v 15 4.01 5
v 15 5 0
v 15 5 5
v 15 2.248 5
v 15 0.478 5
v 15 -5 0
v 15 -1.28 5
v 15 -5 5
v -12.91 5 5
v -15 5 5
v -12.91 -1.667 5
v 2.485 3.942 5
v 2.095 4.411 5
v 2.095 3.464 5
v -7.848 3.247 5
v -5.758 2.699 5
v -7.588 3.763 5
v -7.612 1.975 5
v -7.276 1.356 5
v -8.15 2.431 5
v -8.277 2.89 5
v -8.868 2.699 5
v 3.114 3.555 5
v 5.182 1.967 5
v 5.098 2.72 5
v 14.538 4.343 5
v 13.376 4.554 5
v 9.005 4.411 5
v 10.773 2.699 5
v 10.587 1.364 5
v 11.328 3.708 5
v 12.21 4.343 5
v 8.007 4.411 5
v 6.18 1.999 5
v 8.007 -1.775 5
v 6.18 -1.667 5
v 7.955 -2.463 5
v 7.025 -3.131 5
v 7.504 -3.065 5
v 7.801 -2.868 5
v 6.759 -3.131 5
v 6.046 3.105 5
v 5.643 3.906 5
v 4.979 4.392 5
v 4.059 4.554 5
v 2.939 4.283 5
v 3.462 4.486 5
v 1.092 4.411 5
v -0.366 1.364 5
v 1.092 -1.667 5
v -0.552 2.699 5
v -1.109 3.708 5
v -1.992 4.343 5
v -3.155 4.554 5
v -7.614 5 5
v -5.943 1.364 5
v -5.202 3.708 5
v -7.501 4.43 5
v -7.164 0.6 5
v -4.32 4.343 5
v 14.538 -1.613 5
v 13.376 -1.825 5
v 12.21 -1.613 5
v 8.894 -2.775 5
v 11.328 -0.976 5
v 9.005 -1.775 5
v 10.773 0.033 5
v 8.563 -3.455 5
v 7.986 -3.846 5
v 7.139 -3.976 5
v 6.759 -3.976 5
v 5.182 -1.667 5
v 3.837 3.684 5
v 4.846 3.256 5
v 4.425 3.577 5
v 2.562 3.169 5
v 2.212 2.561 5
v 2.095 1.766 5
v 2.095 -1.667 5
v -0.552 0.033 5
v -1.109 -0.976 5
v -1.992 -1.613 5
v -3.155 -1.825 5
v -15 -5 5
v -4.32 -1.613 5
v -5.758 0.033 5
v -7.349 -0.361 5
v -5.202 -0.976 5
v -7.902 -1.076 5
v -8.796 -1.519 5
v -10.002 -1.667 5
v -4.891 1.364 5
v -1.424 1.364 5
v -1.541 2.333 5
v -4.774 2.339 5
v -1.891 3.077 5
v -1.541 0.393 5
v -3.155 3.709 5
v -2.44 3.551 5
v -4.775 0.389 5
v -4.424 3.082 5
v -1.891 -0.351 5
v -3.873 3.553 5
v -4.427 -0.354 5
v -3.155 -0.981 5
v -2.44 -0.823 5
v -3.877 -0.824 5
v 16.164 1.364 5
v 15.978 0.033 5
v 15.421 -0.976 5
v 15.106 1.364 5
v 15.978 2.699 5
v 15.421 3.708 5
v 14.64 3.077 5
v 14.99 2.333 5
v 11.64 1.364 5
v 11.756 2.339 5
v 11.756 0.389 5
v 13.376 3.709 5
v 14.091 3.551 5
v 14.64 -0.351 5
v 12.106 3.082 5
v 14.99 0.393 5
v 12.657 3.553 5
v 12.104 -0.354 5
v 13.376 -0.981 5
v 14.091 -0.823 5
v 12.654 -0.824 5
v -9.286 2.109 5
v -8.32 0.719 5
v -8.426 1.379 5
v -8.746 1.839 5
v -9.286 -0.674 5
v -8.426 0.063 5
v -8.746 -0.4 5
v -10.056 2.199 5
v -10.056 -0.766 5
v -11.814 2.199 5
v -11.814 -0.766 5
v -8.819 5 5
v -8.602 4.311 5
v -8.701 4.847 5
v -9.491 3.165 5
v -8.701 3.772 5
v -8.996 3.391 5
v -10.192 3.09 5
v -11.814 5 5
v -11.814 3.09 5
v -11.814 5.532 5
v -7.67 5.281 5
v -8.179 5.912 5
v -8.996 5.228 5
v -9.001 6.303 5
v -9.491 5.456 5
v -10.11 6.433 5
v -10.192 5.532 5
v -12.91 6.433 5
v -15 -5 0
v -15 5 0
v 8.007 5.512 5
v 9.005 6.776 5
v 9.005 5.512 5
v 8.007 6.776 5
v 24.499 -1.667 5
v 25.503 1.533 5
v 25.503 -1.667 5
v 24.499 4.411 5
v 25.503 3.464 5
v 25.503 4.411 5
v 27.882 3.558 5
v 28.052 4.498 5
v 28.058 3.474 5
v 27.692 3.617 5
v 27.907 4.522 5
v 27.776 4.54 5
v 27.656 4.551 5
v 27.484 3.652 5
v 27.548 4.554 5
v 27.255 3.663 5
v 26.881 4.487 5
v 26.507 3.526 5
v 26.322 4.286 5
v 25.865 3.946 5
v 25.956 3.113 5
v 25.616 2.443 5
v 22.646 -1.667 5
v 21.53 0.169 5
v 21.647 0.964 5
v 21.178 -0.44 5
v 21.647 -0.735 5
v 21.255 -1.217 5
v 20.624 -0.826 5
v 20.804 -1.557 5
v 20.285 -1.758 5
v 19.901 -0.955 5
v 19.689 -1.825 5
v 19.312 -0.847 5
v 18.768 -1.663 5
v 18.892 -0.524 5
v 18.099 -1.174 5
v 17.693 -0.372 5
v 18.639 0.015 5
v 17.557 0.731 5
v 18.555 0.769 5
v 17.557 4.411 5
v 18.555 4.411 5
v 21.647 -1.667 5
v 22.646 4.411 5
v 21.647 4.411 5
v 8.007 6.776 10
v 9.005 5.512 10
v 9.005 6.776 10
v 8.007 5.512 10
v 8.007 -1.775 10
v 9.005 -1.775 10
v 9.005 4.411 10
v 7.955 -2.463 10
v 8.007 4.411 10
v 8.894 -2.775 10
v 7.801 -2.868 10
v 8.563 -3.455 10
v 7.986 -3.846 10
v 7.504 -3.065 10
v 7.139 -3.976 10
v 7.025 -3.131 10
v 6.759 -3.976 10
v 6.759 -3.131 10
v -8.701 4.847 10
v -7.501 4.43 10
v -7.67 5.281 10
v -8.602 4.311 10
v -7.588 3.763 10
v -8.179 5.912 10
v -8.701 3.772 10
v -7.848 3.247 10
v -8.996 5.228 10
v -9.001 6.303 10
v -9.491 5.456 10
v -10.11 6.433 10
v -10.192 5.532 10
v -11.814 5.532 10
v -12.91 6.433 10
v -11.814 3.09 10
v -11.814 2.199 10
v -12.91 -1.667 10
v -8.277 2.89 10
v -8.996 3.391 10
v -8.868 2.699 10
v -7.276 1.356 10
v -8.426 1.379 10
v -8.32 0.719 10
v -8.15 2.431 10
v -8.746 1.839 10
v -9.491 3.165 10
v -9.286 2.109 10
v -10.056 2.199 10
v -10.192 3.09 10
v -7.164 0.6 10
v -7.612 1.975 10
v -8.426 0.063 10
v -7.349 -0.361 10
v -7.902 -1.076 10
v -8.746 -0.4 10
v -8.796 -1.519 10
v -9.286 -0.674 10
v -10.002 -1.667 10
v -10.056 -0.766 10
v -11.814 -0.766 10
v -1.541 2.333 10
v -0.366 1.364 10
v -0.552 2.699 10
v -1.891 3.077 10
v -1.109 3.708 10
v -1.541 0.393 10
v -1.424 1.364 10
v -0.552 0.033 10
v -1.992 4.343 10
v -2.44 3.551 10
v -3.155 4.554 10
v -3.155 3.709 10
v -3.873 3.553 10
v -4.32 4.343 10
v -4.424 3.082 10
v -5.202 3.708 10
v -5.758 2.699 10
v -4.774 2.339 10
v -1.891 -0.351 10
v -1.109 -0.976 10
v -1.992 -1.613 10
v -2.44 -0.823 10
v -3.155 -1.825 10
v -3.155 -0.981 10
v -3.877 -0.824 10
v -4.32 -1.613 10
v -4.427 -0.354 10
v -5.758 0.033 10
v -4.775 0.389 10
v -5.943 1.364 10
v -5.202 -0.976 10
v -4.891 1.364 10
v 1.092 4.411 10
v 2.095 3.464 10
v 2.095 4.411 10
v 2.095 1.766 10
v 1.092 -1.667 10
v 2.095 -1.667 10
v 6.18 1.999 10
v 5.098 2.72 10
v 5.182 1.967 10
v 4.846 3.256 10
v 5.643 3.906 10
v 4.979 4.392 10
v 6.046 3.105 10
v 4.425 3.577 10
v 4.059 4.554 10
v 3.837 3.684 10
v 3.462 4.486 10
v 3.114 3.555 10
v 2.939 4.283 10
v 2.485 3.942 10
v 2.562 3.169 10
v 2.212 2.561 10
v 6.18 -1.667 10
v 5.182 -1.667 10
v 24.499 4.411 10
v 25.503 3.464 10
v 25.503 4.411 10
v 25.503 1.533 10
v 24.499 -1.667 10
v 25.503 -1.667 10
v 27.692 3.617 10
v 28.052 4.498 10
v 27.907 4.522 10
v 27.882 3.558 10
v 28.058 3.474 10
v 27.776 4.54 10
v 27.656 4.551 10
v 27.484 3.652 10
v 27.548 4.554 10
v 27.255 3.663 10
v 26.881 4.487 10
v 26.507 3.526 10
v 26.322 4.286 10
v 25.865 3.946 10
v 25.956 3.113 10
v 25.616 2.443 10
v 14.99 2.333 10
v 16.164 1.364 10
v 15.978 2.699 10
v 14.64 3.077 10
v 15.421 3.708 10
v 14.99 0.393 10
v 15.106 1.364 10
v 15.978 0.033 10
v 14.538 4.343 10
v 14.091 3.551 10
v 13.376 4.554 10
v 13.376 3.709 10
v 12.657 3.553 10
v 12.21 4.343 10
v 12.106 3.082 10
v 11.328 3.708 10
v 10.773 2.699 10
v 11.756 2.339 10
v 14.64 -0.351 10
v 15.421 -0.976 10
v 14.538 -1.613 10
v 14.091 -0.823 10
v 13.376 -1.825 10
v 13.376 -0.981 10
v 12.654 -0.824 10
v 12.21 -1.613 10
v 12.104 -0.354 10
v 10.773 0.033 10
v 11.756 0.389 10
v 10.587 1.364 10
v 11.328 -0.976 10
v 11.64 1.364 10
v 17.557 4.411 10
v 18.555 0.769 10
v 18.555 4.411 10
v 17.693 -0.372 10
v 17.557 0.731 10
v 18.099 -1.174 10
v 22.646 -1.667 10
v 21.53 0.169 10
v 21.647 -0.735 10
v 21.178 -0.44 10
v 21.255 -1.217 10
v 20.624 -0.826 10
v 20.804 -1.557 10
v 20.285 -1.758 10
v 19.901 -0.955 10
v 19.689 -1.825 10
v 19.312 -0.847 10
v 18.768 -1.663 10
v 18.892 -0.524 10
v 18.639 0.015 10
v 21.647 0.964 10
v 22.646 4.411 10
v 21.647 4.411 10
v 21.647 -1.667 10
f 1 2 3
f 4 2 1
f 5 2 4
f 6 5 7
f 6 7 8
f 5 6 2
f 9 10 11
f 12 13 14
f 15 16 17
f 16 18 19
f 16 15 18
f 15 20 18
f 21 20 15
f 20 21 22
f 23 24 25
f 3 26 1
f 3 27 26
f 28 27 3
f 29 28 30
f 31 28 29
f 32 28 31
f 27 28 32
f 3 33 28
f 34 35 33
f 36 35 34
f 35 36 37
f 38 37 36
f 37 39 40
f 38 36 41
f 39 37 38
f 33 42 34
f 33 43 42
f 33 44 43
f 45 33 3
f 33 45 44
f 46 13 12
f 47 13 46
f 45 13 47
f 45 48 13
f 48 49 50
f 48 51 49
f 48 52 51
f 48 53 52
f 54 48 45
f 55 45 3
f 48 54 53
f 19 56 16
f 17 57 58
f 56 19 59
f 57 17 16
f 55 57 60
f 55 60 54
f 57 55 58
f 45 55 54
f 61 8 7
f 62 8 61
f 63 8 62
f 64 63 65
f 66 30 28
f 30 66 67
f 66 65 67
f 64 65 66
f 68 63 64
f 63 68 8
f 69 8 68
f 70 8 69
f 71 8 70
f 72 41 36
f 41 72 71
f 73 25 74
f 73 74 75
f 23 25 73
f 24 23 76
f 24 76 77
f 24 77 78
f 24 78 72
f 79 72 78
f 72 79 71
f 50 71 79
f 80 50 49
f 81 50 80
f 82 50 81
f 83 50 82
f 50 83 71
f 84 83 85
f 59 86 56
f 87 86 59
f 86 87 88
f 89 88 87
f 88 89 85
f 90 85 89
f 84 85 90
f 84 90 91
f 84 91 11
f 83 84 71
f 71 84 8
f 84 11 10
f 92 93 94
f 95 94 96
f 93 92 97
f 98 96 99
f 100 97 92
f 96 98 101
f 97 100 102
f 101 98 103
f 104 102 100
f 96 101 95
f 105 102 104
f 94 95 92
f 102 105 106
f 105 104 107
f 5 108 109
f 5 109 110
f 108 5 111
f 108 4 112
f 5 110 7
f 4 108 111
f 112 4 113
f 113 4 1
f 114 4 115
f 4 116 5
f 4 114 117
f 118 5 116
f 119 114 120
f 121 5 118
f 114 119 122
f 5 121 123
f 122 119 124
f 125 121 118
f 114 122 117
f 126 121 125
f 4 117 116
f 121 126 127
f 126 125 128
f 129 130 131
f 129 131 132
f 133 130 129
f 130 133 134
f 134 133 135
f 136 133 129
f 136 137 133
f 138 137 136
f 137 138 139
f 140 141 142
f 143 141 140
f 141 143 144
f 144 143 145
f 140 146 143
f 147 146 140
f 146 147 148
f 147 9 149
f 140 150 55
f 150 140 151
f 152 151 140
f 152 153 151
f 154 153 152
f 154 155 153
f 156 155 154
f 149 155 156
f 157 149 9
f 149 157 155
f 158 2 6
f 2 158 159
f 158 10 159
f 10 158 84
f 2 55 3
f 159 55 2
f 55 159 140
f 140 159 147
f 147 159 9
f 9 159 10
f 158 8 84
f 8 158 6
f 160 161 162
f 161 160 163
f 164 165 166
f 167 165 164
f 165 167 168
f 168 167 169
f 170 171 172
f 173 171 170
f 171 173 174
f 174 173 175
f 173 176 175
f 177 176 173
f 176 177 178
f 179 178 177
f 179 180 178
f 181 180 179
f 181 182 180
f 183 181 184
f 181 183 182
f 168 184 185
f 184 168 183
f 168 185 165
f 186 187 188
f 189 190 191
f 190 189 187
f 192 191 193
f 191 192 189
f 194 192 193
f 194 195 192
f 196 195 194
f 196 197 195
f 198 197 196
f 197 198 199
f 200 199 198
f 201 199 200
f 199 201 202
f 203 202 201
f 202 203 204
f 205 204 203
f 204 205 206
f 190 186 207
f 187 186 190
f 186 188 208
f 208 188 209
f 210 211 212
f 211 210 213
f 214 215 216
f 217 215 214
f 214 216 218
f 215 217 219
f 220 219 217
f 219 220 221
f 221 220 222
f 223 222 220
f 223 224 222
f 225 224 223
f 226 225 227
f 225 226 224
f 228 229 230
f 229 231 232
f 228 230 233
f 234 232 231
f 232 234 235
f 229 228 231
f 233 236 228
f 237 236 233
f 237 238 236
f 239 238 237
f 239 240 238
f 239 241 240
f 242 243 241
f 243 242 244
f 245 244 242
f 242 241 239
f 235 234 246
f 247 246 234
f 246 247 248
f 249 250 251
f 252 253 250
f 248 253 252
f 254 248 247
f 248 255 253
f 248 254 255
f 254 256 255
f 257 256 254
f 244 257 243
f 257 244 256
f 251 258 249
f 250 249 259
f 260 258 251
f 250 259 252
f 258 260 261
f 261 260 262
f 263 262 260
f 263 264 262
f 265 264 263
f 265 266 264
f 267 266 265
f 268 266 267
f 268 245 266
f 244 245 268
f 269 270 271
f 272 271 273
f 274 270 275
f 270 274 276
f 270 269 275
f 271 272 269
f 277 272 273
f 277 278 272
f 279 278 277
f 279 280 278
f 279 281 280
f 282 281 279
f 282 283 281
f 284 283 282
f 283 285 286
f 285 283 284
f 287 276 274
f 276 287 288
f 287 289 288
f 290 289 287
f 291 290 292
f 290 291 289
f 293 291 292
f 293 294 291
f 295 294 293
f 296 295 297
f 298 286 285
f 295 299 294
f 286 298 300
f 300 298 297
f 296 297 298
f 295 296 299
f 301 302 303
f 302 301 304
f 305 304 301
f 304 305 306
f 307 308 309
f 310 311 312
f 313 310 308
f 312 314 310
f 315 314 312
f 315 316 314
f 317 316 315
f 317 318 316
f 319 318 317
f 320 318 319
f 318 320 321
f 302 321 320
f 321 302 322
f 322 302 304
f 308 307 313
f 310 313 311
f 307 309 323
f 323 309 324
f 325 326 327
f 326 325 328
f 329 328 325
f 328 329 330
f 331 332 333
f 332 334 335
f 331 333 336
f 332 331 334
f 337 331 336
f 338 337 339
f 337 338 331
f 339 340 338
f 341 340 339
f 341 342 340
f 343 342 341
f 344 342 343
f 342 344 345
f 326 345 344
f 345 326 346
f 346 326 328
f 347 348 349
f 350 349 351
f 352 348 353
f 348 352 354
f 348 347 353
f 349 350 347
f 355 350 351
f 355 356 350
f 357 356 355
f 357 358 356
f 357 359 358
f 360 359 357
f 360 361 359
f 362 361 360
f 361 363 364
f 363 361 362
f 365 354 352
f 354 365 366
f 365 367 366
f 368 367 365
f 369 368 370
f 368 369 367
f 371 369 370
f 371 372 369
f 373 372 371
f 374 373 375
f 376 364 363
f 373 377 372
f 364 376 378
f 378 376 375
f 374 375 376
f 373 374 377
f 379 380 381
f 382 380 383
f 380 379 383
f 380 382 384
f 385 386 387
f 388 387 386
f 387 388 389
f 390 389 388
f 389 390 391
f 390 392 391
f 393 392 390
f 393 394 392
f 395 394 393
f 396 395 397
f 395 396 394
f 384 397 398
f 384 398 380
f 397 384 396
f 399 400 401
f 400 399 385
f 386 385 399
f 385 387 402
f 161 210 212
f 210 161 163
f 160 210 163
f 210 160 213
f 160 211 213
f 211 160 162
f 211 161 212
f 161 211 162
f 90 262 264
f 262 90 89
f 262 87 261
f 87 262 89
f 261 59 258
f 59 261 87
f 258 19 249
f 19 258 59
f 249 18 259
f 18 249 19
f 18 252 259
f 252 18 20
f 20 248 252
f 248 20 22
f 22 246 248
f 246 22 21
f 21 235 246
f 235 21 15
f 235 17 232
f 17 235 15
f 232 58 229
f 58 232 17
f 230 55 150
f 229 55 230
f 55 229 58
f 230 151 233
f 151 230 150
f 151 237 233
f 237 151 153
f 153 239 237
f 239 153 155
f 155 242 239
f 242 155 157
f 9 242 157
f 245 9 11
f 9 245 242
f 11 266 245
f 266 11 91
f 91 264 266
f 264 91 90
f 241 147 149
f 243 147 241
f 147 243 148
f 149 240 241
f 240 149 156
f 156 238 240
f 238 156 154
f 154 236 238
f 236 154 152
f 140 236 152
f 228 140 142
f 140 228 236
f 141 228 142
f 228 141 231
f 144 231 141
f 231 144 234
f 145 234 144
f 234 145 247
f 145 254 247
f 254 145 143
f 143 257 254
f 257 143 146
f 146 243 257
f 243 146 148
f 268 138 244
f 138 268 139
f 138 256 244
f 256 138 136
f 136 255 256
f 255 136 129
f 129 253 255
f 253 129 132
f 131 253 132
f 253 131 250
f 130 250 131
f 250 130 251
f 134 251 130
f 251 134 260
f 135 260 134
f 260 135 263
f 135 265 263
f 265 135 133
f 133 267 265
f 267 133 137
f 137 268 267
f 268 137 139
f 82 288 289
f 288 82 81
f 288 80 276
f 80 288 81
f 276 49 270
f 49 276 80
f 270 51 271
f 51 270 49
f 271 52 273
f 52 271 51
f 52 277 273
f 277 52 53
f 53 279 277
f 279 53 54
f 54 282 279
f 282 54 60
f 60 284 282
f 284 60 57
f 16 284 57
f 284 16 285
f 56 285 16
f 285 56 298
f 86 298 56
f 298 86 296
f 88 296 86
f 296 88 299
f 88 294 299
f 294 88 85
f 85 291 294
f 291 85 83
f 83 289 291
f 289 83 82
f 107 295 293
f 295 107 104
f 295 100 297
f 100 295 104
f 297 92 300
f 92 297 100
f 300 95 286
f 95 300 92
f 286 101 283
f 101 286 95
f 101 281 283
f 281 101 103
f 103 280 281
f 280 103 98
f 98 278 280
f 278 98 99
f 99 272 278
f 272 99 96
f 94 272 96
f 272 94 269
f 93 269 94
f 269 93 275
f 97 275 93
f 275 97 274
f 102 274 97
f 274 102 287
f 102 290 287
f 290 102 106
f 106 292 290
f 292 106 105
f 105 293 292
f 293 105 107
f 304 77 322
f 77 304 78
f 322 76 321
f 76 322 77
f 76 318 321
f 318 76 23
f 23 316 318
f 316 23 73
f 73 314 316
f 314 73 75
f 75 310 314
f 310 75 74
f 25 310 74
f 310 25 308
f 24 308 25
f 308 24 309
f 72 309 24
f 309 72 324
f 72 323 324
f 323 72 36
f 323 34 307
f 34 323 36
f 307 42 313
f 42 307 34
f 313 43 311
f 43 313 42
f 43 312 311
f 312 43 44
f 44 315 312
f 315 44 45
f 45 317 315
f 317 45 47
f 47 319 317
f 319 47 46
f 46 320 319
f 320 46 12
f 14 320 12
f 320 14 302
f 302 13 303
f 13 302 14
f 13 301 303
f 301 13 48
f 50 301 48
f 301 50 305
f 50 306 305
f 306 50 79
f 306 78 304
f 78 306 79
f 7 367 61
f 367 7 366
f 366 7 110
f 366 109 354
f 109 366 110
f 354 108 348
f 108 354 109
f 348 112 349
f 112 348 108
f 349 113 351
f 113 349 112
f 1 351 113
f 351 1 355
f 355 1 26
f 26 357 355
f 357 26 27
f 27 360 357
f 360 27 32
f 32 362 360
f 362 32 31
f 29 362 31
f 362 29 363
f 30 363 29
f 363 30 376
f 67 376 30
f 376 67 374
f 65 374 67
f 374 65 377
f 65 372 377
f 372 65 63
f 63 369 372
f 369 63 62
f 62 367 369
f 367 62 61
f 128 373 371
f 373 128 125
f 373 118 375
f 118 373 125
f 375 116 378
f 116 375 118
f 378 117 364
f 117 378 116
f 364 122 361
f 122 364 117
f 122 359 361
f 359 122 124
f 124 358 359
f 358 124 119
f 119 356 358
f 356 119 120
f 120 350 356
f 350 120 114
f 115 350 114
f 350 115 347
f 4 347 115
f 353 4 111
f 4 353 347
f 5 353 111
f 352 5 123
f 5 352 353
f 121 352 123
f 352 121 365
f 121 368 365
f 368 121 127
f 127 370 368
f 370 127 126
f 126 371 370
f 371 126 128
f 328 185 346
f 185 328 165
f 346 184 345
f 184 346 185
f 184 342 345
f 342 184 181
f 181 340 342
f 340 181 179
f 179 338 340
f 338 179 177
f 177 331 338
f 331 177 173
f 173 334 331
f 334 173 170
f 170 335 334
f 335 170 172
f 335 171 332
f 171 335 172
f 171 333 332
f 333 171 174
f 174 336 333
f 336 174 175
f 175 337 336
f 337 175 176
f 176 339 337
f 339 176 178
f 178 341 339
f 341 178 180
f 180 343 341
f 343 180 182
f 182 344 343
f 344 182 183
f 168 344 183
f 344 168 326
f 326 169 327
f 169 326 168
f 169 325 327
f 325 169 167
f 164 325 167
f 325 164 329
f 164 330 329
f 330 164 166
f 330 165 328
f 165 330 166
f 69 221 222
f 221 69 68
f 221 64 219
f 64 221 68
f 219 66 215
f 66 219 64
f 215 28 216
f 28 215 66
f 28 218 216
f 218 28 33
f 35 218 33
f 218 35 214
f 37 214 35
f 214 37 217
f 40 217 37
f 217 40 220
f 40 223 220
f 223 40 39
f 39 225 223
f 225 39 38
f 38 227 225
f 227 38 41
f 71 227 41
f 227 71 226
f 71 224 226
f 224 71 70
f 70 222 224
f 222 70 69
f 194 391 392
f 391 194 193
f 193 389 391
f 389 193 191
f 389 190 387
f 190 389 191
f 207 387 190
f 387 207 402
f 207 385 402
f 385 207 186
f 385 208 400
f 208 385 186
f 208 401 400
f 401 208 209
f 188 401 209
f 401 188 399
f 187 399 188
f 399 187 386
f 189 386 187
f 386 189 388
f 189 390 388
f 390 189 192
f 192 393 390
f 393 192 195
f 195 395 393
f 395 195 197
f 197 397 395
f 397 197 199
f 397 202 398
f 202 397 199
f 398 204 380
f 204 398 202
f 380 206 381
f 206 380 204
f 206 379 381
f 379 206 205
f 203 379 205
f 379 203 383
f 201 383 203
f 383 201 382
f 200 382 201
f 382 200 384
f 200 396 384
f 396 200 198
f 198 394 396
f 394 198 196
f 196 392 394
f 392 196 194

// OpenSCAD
$fn = 3; 
texte_a_inserer = "Bonjour"; 
taille = 8; 
police = "DejaVuSans"; //[[Abril Fatface,Aclonica,Acme,Advent Pro,Akronim,Aladin,Alegreya,Alegreya Sans,Alegreya SC,Alex Brush,Alfa Slab One,Alice,Amaranth,Architects Daughter,Archivo Black,Archivo Narrow,Arimo,Arvo,Asap,Astloch,Asul,Averia Libre,Averia Serif Libre,Bangers,Basic,Belgrano,Berkshire Swash,Bigshot One,Bilbo Swash Caps,Black Ops One,Bonbon,Bowlby One SC,Brawler,Bubblegum Sans,Butterfly Kids,Cabin Condensed,Caesar Dressing,Cagliostro,Calligraffitti,Capriola,Carter One,Changa One,Chango,Chelsea Market,Cherry Cream Soda,Chewy,Chicle,Chivo,Clicker Script,Coming Soon,Concert One,Condiment,Cookie,Courgette,Covered By Your Grace,Crimson Text,Dancing Script,DejaVu Sans,DejaVu Serif,Dhurjati,Doppio One,Dosis,Droid Sans,Eagle Lake,Electrolize,Emilys Candy,Encode Sans,Encode Sans Compressed,Euphoria Script,Exo,Exo 2,Faster One,Federo,Finger Paint,Fjord One,Fontdiner Swanky,Freckle Face,Fruktur,Gabriela,Geo,Germania One,Give You Glory,Gloria Hallelujah,Goudy Bookletter 1911,Graduate,Grand Hotel,Great Vibes,Griffy,Hanalei Fill,Happy Monkey,Henny Penny,Hind,IM Fell English SC,Indie Flower,Irish Grover,Italianno,Jacques Francois Shadow,Jolly Lodger,Josefin Slab,Joti One,Judson,Just Another Hand,Kalam,Kameron,Karma,Kavoon,Knewave,Kranky,Kristi,Laila,Lakki Reddy,Lancelot,Lato,Leckerli One,Ledger,Lekton,Lemon One,Liberation Sans,Libre Caslon Text,Life Savers,Lilita One,Lily Script One,Limelight,Lobster,Lobster Two,Londrina Outline,Londrina Shadow,Londrina Solid,Lora,Love Ya Like A Sister,Loved by the King,Lovers Quarrel,Luckiest Guy,Lusitana,Macondo,Macondo Swash Caps,Mako,Marck Script,Margarine,Marko One,Maven Pro,McLaren,MedievalSharp,Merienda One,Merriweather,Mervale Script,Metal Mania,Metrophobic,Milonga,Miltonian Tattoo,Miss Fajardose,Molle,Montez,Montserrat,Mr De Haviland,Mystery Quest,Neucha,New Rocker,Niconne,Nosifer,Nothing You Could Do,Noto Sans Oriya,Noto Serif,Nova Square,Nunito,Old Standard TT,Oleo Script,Oleo Script Swash Caps,Orbitron,Oregano,Orienta,Original Surfer,Oswald,Over the Rainbow,Overlock,Oxygen,Pacifico,Paprika,Parisienne,Patrick Hand SC,Paytone One,Peralta,Permanent Marker,Piedra,Pirata One,Play,Playball,Poetsen One,Poppins,Press Start 2P,Princess Sofia,PT Mono,Qwigley,Racing Sans One,Raleway,Rancho,Ranga,Ribeye,Roboto,Roboto Condensed,Roboto Slab,Rochester,Rock Salt,Rubik One,Sail,Salsa,Sansita One,Sarina,Satisfy,Schoolbell,Seaweed Script,Sevillana,Shadows Into Light,Shadows Into Light Two,Share,Six Caps,Skranji,Source Sans Pro,Spicy Rice,Stardos Stencil,Stoke,Syncopate,Teko,Terminal Dosis,The Girl Next Door,Tillana,Timmana,Titillium Web,Ubuntu,Ultra,Underdog,UnifrakturCook,UnifrakturMaguntia,Vampiro One,Vidaloka,Viga,Voces,Volkhov,Vollkorn,Voltaire,Waiting for the Sunrise,Wallpoet,Wellfleet,Wendy One,Yellowtail,Yesteryear,Zeyada]]
hauteur = 5; 
longueur_cube = 30; 
largeur_cube = 10; 
hauteur_cube = 5; 
relief_extrusion = "relief"; //[relief,extru]
module rendu(){
linear_extrude(hauteur) text(texte_a_inserer,size = taille, font = police);
}
module finao(){
if ( relief_extrusion == "relief") {
   union(){
 translate([0,0,0])   cube([longueur_cube,largeur_cube,hauteur_cube]);
translate([1,(largeur_cube/3),hauteur_cube]) rendu();
   } 
}
else
{
difference(){
 translate([0,0,0])   cube([longueur_cube,largeur_cube,hauteur_cube]);
translate([1,(largeur_cube/3),(hauteur_cube -hauteur+0.1)]) rendu();
}
 }
}
translate ([-(longueur_cube/2),-(largeur_cube/2),0]) finao();
